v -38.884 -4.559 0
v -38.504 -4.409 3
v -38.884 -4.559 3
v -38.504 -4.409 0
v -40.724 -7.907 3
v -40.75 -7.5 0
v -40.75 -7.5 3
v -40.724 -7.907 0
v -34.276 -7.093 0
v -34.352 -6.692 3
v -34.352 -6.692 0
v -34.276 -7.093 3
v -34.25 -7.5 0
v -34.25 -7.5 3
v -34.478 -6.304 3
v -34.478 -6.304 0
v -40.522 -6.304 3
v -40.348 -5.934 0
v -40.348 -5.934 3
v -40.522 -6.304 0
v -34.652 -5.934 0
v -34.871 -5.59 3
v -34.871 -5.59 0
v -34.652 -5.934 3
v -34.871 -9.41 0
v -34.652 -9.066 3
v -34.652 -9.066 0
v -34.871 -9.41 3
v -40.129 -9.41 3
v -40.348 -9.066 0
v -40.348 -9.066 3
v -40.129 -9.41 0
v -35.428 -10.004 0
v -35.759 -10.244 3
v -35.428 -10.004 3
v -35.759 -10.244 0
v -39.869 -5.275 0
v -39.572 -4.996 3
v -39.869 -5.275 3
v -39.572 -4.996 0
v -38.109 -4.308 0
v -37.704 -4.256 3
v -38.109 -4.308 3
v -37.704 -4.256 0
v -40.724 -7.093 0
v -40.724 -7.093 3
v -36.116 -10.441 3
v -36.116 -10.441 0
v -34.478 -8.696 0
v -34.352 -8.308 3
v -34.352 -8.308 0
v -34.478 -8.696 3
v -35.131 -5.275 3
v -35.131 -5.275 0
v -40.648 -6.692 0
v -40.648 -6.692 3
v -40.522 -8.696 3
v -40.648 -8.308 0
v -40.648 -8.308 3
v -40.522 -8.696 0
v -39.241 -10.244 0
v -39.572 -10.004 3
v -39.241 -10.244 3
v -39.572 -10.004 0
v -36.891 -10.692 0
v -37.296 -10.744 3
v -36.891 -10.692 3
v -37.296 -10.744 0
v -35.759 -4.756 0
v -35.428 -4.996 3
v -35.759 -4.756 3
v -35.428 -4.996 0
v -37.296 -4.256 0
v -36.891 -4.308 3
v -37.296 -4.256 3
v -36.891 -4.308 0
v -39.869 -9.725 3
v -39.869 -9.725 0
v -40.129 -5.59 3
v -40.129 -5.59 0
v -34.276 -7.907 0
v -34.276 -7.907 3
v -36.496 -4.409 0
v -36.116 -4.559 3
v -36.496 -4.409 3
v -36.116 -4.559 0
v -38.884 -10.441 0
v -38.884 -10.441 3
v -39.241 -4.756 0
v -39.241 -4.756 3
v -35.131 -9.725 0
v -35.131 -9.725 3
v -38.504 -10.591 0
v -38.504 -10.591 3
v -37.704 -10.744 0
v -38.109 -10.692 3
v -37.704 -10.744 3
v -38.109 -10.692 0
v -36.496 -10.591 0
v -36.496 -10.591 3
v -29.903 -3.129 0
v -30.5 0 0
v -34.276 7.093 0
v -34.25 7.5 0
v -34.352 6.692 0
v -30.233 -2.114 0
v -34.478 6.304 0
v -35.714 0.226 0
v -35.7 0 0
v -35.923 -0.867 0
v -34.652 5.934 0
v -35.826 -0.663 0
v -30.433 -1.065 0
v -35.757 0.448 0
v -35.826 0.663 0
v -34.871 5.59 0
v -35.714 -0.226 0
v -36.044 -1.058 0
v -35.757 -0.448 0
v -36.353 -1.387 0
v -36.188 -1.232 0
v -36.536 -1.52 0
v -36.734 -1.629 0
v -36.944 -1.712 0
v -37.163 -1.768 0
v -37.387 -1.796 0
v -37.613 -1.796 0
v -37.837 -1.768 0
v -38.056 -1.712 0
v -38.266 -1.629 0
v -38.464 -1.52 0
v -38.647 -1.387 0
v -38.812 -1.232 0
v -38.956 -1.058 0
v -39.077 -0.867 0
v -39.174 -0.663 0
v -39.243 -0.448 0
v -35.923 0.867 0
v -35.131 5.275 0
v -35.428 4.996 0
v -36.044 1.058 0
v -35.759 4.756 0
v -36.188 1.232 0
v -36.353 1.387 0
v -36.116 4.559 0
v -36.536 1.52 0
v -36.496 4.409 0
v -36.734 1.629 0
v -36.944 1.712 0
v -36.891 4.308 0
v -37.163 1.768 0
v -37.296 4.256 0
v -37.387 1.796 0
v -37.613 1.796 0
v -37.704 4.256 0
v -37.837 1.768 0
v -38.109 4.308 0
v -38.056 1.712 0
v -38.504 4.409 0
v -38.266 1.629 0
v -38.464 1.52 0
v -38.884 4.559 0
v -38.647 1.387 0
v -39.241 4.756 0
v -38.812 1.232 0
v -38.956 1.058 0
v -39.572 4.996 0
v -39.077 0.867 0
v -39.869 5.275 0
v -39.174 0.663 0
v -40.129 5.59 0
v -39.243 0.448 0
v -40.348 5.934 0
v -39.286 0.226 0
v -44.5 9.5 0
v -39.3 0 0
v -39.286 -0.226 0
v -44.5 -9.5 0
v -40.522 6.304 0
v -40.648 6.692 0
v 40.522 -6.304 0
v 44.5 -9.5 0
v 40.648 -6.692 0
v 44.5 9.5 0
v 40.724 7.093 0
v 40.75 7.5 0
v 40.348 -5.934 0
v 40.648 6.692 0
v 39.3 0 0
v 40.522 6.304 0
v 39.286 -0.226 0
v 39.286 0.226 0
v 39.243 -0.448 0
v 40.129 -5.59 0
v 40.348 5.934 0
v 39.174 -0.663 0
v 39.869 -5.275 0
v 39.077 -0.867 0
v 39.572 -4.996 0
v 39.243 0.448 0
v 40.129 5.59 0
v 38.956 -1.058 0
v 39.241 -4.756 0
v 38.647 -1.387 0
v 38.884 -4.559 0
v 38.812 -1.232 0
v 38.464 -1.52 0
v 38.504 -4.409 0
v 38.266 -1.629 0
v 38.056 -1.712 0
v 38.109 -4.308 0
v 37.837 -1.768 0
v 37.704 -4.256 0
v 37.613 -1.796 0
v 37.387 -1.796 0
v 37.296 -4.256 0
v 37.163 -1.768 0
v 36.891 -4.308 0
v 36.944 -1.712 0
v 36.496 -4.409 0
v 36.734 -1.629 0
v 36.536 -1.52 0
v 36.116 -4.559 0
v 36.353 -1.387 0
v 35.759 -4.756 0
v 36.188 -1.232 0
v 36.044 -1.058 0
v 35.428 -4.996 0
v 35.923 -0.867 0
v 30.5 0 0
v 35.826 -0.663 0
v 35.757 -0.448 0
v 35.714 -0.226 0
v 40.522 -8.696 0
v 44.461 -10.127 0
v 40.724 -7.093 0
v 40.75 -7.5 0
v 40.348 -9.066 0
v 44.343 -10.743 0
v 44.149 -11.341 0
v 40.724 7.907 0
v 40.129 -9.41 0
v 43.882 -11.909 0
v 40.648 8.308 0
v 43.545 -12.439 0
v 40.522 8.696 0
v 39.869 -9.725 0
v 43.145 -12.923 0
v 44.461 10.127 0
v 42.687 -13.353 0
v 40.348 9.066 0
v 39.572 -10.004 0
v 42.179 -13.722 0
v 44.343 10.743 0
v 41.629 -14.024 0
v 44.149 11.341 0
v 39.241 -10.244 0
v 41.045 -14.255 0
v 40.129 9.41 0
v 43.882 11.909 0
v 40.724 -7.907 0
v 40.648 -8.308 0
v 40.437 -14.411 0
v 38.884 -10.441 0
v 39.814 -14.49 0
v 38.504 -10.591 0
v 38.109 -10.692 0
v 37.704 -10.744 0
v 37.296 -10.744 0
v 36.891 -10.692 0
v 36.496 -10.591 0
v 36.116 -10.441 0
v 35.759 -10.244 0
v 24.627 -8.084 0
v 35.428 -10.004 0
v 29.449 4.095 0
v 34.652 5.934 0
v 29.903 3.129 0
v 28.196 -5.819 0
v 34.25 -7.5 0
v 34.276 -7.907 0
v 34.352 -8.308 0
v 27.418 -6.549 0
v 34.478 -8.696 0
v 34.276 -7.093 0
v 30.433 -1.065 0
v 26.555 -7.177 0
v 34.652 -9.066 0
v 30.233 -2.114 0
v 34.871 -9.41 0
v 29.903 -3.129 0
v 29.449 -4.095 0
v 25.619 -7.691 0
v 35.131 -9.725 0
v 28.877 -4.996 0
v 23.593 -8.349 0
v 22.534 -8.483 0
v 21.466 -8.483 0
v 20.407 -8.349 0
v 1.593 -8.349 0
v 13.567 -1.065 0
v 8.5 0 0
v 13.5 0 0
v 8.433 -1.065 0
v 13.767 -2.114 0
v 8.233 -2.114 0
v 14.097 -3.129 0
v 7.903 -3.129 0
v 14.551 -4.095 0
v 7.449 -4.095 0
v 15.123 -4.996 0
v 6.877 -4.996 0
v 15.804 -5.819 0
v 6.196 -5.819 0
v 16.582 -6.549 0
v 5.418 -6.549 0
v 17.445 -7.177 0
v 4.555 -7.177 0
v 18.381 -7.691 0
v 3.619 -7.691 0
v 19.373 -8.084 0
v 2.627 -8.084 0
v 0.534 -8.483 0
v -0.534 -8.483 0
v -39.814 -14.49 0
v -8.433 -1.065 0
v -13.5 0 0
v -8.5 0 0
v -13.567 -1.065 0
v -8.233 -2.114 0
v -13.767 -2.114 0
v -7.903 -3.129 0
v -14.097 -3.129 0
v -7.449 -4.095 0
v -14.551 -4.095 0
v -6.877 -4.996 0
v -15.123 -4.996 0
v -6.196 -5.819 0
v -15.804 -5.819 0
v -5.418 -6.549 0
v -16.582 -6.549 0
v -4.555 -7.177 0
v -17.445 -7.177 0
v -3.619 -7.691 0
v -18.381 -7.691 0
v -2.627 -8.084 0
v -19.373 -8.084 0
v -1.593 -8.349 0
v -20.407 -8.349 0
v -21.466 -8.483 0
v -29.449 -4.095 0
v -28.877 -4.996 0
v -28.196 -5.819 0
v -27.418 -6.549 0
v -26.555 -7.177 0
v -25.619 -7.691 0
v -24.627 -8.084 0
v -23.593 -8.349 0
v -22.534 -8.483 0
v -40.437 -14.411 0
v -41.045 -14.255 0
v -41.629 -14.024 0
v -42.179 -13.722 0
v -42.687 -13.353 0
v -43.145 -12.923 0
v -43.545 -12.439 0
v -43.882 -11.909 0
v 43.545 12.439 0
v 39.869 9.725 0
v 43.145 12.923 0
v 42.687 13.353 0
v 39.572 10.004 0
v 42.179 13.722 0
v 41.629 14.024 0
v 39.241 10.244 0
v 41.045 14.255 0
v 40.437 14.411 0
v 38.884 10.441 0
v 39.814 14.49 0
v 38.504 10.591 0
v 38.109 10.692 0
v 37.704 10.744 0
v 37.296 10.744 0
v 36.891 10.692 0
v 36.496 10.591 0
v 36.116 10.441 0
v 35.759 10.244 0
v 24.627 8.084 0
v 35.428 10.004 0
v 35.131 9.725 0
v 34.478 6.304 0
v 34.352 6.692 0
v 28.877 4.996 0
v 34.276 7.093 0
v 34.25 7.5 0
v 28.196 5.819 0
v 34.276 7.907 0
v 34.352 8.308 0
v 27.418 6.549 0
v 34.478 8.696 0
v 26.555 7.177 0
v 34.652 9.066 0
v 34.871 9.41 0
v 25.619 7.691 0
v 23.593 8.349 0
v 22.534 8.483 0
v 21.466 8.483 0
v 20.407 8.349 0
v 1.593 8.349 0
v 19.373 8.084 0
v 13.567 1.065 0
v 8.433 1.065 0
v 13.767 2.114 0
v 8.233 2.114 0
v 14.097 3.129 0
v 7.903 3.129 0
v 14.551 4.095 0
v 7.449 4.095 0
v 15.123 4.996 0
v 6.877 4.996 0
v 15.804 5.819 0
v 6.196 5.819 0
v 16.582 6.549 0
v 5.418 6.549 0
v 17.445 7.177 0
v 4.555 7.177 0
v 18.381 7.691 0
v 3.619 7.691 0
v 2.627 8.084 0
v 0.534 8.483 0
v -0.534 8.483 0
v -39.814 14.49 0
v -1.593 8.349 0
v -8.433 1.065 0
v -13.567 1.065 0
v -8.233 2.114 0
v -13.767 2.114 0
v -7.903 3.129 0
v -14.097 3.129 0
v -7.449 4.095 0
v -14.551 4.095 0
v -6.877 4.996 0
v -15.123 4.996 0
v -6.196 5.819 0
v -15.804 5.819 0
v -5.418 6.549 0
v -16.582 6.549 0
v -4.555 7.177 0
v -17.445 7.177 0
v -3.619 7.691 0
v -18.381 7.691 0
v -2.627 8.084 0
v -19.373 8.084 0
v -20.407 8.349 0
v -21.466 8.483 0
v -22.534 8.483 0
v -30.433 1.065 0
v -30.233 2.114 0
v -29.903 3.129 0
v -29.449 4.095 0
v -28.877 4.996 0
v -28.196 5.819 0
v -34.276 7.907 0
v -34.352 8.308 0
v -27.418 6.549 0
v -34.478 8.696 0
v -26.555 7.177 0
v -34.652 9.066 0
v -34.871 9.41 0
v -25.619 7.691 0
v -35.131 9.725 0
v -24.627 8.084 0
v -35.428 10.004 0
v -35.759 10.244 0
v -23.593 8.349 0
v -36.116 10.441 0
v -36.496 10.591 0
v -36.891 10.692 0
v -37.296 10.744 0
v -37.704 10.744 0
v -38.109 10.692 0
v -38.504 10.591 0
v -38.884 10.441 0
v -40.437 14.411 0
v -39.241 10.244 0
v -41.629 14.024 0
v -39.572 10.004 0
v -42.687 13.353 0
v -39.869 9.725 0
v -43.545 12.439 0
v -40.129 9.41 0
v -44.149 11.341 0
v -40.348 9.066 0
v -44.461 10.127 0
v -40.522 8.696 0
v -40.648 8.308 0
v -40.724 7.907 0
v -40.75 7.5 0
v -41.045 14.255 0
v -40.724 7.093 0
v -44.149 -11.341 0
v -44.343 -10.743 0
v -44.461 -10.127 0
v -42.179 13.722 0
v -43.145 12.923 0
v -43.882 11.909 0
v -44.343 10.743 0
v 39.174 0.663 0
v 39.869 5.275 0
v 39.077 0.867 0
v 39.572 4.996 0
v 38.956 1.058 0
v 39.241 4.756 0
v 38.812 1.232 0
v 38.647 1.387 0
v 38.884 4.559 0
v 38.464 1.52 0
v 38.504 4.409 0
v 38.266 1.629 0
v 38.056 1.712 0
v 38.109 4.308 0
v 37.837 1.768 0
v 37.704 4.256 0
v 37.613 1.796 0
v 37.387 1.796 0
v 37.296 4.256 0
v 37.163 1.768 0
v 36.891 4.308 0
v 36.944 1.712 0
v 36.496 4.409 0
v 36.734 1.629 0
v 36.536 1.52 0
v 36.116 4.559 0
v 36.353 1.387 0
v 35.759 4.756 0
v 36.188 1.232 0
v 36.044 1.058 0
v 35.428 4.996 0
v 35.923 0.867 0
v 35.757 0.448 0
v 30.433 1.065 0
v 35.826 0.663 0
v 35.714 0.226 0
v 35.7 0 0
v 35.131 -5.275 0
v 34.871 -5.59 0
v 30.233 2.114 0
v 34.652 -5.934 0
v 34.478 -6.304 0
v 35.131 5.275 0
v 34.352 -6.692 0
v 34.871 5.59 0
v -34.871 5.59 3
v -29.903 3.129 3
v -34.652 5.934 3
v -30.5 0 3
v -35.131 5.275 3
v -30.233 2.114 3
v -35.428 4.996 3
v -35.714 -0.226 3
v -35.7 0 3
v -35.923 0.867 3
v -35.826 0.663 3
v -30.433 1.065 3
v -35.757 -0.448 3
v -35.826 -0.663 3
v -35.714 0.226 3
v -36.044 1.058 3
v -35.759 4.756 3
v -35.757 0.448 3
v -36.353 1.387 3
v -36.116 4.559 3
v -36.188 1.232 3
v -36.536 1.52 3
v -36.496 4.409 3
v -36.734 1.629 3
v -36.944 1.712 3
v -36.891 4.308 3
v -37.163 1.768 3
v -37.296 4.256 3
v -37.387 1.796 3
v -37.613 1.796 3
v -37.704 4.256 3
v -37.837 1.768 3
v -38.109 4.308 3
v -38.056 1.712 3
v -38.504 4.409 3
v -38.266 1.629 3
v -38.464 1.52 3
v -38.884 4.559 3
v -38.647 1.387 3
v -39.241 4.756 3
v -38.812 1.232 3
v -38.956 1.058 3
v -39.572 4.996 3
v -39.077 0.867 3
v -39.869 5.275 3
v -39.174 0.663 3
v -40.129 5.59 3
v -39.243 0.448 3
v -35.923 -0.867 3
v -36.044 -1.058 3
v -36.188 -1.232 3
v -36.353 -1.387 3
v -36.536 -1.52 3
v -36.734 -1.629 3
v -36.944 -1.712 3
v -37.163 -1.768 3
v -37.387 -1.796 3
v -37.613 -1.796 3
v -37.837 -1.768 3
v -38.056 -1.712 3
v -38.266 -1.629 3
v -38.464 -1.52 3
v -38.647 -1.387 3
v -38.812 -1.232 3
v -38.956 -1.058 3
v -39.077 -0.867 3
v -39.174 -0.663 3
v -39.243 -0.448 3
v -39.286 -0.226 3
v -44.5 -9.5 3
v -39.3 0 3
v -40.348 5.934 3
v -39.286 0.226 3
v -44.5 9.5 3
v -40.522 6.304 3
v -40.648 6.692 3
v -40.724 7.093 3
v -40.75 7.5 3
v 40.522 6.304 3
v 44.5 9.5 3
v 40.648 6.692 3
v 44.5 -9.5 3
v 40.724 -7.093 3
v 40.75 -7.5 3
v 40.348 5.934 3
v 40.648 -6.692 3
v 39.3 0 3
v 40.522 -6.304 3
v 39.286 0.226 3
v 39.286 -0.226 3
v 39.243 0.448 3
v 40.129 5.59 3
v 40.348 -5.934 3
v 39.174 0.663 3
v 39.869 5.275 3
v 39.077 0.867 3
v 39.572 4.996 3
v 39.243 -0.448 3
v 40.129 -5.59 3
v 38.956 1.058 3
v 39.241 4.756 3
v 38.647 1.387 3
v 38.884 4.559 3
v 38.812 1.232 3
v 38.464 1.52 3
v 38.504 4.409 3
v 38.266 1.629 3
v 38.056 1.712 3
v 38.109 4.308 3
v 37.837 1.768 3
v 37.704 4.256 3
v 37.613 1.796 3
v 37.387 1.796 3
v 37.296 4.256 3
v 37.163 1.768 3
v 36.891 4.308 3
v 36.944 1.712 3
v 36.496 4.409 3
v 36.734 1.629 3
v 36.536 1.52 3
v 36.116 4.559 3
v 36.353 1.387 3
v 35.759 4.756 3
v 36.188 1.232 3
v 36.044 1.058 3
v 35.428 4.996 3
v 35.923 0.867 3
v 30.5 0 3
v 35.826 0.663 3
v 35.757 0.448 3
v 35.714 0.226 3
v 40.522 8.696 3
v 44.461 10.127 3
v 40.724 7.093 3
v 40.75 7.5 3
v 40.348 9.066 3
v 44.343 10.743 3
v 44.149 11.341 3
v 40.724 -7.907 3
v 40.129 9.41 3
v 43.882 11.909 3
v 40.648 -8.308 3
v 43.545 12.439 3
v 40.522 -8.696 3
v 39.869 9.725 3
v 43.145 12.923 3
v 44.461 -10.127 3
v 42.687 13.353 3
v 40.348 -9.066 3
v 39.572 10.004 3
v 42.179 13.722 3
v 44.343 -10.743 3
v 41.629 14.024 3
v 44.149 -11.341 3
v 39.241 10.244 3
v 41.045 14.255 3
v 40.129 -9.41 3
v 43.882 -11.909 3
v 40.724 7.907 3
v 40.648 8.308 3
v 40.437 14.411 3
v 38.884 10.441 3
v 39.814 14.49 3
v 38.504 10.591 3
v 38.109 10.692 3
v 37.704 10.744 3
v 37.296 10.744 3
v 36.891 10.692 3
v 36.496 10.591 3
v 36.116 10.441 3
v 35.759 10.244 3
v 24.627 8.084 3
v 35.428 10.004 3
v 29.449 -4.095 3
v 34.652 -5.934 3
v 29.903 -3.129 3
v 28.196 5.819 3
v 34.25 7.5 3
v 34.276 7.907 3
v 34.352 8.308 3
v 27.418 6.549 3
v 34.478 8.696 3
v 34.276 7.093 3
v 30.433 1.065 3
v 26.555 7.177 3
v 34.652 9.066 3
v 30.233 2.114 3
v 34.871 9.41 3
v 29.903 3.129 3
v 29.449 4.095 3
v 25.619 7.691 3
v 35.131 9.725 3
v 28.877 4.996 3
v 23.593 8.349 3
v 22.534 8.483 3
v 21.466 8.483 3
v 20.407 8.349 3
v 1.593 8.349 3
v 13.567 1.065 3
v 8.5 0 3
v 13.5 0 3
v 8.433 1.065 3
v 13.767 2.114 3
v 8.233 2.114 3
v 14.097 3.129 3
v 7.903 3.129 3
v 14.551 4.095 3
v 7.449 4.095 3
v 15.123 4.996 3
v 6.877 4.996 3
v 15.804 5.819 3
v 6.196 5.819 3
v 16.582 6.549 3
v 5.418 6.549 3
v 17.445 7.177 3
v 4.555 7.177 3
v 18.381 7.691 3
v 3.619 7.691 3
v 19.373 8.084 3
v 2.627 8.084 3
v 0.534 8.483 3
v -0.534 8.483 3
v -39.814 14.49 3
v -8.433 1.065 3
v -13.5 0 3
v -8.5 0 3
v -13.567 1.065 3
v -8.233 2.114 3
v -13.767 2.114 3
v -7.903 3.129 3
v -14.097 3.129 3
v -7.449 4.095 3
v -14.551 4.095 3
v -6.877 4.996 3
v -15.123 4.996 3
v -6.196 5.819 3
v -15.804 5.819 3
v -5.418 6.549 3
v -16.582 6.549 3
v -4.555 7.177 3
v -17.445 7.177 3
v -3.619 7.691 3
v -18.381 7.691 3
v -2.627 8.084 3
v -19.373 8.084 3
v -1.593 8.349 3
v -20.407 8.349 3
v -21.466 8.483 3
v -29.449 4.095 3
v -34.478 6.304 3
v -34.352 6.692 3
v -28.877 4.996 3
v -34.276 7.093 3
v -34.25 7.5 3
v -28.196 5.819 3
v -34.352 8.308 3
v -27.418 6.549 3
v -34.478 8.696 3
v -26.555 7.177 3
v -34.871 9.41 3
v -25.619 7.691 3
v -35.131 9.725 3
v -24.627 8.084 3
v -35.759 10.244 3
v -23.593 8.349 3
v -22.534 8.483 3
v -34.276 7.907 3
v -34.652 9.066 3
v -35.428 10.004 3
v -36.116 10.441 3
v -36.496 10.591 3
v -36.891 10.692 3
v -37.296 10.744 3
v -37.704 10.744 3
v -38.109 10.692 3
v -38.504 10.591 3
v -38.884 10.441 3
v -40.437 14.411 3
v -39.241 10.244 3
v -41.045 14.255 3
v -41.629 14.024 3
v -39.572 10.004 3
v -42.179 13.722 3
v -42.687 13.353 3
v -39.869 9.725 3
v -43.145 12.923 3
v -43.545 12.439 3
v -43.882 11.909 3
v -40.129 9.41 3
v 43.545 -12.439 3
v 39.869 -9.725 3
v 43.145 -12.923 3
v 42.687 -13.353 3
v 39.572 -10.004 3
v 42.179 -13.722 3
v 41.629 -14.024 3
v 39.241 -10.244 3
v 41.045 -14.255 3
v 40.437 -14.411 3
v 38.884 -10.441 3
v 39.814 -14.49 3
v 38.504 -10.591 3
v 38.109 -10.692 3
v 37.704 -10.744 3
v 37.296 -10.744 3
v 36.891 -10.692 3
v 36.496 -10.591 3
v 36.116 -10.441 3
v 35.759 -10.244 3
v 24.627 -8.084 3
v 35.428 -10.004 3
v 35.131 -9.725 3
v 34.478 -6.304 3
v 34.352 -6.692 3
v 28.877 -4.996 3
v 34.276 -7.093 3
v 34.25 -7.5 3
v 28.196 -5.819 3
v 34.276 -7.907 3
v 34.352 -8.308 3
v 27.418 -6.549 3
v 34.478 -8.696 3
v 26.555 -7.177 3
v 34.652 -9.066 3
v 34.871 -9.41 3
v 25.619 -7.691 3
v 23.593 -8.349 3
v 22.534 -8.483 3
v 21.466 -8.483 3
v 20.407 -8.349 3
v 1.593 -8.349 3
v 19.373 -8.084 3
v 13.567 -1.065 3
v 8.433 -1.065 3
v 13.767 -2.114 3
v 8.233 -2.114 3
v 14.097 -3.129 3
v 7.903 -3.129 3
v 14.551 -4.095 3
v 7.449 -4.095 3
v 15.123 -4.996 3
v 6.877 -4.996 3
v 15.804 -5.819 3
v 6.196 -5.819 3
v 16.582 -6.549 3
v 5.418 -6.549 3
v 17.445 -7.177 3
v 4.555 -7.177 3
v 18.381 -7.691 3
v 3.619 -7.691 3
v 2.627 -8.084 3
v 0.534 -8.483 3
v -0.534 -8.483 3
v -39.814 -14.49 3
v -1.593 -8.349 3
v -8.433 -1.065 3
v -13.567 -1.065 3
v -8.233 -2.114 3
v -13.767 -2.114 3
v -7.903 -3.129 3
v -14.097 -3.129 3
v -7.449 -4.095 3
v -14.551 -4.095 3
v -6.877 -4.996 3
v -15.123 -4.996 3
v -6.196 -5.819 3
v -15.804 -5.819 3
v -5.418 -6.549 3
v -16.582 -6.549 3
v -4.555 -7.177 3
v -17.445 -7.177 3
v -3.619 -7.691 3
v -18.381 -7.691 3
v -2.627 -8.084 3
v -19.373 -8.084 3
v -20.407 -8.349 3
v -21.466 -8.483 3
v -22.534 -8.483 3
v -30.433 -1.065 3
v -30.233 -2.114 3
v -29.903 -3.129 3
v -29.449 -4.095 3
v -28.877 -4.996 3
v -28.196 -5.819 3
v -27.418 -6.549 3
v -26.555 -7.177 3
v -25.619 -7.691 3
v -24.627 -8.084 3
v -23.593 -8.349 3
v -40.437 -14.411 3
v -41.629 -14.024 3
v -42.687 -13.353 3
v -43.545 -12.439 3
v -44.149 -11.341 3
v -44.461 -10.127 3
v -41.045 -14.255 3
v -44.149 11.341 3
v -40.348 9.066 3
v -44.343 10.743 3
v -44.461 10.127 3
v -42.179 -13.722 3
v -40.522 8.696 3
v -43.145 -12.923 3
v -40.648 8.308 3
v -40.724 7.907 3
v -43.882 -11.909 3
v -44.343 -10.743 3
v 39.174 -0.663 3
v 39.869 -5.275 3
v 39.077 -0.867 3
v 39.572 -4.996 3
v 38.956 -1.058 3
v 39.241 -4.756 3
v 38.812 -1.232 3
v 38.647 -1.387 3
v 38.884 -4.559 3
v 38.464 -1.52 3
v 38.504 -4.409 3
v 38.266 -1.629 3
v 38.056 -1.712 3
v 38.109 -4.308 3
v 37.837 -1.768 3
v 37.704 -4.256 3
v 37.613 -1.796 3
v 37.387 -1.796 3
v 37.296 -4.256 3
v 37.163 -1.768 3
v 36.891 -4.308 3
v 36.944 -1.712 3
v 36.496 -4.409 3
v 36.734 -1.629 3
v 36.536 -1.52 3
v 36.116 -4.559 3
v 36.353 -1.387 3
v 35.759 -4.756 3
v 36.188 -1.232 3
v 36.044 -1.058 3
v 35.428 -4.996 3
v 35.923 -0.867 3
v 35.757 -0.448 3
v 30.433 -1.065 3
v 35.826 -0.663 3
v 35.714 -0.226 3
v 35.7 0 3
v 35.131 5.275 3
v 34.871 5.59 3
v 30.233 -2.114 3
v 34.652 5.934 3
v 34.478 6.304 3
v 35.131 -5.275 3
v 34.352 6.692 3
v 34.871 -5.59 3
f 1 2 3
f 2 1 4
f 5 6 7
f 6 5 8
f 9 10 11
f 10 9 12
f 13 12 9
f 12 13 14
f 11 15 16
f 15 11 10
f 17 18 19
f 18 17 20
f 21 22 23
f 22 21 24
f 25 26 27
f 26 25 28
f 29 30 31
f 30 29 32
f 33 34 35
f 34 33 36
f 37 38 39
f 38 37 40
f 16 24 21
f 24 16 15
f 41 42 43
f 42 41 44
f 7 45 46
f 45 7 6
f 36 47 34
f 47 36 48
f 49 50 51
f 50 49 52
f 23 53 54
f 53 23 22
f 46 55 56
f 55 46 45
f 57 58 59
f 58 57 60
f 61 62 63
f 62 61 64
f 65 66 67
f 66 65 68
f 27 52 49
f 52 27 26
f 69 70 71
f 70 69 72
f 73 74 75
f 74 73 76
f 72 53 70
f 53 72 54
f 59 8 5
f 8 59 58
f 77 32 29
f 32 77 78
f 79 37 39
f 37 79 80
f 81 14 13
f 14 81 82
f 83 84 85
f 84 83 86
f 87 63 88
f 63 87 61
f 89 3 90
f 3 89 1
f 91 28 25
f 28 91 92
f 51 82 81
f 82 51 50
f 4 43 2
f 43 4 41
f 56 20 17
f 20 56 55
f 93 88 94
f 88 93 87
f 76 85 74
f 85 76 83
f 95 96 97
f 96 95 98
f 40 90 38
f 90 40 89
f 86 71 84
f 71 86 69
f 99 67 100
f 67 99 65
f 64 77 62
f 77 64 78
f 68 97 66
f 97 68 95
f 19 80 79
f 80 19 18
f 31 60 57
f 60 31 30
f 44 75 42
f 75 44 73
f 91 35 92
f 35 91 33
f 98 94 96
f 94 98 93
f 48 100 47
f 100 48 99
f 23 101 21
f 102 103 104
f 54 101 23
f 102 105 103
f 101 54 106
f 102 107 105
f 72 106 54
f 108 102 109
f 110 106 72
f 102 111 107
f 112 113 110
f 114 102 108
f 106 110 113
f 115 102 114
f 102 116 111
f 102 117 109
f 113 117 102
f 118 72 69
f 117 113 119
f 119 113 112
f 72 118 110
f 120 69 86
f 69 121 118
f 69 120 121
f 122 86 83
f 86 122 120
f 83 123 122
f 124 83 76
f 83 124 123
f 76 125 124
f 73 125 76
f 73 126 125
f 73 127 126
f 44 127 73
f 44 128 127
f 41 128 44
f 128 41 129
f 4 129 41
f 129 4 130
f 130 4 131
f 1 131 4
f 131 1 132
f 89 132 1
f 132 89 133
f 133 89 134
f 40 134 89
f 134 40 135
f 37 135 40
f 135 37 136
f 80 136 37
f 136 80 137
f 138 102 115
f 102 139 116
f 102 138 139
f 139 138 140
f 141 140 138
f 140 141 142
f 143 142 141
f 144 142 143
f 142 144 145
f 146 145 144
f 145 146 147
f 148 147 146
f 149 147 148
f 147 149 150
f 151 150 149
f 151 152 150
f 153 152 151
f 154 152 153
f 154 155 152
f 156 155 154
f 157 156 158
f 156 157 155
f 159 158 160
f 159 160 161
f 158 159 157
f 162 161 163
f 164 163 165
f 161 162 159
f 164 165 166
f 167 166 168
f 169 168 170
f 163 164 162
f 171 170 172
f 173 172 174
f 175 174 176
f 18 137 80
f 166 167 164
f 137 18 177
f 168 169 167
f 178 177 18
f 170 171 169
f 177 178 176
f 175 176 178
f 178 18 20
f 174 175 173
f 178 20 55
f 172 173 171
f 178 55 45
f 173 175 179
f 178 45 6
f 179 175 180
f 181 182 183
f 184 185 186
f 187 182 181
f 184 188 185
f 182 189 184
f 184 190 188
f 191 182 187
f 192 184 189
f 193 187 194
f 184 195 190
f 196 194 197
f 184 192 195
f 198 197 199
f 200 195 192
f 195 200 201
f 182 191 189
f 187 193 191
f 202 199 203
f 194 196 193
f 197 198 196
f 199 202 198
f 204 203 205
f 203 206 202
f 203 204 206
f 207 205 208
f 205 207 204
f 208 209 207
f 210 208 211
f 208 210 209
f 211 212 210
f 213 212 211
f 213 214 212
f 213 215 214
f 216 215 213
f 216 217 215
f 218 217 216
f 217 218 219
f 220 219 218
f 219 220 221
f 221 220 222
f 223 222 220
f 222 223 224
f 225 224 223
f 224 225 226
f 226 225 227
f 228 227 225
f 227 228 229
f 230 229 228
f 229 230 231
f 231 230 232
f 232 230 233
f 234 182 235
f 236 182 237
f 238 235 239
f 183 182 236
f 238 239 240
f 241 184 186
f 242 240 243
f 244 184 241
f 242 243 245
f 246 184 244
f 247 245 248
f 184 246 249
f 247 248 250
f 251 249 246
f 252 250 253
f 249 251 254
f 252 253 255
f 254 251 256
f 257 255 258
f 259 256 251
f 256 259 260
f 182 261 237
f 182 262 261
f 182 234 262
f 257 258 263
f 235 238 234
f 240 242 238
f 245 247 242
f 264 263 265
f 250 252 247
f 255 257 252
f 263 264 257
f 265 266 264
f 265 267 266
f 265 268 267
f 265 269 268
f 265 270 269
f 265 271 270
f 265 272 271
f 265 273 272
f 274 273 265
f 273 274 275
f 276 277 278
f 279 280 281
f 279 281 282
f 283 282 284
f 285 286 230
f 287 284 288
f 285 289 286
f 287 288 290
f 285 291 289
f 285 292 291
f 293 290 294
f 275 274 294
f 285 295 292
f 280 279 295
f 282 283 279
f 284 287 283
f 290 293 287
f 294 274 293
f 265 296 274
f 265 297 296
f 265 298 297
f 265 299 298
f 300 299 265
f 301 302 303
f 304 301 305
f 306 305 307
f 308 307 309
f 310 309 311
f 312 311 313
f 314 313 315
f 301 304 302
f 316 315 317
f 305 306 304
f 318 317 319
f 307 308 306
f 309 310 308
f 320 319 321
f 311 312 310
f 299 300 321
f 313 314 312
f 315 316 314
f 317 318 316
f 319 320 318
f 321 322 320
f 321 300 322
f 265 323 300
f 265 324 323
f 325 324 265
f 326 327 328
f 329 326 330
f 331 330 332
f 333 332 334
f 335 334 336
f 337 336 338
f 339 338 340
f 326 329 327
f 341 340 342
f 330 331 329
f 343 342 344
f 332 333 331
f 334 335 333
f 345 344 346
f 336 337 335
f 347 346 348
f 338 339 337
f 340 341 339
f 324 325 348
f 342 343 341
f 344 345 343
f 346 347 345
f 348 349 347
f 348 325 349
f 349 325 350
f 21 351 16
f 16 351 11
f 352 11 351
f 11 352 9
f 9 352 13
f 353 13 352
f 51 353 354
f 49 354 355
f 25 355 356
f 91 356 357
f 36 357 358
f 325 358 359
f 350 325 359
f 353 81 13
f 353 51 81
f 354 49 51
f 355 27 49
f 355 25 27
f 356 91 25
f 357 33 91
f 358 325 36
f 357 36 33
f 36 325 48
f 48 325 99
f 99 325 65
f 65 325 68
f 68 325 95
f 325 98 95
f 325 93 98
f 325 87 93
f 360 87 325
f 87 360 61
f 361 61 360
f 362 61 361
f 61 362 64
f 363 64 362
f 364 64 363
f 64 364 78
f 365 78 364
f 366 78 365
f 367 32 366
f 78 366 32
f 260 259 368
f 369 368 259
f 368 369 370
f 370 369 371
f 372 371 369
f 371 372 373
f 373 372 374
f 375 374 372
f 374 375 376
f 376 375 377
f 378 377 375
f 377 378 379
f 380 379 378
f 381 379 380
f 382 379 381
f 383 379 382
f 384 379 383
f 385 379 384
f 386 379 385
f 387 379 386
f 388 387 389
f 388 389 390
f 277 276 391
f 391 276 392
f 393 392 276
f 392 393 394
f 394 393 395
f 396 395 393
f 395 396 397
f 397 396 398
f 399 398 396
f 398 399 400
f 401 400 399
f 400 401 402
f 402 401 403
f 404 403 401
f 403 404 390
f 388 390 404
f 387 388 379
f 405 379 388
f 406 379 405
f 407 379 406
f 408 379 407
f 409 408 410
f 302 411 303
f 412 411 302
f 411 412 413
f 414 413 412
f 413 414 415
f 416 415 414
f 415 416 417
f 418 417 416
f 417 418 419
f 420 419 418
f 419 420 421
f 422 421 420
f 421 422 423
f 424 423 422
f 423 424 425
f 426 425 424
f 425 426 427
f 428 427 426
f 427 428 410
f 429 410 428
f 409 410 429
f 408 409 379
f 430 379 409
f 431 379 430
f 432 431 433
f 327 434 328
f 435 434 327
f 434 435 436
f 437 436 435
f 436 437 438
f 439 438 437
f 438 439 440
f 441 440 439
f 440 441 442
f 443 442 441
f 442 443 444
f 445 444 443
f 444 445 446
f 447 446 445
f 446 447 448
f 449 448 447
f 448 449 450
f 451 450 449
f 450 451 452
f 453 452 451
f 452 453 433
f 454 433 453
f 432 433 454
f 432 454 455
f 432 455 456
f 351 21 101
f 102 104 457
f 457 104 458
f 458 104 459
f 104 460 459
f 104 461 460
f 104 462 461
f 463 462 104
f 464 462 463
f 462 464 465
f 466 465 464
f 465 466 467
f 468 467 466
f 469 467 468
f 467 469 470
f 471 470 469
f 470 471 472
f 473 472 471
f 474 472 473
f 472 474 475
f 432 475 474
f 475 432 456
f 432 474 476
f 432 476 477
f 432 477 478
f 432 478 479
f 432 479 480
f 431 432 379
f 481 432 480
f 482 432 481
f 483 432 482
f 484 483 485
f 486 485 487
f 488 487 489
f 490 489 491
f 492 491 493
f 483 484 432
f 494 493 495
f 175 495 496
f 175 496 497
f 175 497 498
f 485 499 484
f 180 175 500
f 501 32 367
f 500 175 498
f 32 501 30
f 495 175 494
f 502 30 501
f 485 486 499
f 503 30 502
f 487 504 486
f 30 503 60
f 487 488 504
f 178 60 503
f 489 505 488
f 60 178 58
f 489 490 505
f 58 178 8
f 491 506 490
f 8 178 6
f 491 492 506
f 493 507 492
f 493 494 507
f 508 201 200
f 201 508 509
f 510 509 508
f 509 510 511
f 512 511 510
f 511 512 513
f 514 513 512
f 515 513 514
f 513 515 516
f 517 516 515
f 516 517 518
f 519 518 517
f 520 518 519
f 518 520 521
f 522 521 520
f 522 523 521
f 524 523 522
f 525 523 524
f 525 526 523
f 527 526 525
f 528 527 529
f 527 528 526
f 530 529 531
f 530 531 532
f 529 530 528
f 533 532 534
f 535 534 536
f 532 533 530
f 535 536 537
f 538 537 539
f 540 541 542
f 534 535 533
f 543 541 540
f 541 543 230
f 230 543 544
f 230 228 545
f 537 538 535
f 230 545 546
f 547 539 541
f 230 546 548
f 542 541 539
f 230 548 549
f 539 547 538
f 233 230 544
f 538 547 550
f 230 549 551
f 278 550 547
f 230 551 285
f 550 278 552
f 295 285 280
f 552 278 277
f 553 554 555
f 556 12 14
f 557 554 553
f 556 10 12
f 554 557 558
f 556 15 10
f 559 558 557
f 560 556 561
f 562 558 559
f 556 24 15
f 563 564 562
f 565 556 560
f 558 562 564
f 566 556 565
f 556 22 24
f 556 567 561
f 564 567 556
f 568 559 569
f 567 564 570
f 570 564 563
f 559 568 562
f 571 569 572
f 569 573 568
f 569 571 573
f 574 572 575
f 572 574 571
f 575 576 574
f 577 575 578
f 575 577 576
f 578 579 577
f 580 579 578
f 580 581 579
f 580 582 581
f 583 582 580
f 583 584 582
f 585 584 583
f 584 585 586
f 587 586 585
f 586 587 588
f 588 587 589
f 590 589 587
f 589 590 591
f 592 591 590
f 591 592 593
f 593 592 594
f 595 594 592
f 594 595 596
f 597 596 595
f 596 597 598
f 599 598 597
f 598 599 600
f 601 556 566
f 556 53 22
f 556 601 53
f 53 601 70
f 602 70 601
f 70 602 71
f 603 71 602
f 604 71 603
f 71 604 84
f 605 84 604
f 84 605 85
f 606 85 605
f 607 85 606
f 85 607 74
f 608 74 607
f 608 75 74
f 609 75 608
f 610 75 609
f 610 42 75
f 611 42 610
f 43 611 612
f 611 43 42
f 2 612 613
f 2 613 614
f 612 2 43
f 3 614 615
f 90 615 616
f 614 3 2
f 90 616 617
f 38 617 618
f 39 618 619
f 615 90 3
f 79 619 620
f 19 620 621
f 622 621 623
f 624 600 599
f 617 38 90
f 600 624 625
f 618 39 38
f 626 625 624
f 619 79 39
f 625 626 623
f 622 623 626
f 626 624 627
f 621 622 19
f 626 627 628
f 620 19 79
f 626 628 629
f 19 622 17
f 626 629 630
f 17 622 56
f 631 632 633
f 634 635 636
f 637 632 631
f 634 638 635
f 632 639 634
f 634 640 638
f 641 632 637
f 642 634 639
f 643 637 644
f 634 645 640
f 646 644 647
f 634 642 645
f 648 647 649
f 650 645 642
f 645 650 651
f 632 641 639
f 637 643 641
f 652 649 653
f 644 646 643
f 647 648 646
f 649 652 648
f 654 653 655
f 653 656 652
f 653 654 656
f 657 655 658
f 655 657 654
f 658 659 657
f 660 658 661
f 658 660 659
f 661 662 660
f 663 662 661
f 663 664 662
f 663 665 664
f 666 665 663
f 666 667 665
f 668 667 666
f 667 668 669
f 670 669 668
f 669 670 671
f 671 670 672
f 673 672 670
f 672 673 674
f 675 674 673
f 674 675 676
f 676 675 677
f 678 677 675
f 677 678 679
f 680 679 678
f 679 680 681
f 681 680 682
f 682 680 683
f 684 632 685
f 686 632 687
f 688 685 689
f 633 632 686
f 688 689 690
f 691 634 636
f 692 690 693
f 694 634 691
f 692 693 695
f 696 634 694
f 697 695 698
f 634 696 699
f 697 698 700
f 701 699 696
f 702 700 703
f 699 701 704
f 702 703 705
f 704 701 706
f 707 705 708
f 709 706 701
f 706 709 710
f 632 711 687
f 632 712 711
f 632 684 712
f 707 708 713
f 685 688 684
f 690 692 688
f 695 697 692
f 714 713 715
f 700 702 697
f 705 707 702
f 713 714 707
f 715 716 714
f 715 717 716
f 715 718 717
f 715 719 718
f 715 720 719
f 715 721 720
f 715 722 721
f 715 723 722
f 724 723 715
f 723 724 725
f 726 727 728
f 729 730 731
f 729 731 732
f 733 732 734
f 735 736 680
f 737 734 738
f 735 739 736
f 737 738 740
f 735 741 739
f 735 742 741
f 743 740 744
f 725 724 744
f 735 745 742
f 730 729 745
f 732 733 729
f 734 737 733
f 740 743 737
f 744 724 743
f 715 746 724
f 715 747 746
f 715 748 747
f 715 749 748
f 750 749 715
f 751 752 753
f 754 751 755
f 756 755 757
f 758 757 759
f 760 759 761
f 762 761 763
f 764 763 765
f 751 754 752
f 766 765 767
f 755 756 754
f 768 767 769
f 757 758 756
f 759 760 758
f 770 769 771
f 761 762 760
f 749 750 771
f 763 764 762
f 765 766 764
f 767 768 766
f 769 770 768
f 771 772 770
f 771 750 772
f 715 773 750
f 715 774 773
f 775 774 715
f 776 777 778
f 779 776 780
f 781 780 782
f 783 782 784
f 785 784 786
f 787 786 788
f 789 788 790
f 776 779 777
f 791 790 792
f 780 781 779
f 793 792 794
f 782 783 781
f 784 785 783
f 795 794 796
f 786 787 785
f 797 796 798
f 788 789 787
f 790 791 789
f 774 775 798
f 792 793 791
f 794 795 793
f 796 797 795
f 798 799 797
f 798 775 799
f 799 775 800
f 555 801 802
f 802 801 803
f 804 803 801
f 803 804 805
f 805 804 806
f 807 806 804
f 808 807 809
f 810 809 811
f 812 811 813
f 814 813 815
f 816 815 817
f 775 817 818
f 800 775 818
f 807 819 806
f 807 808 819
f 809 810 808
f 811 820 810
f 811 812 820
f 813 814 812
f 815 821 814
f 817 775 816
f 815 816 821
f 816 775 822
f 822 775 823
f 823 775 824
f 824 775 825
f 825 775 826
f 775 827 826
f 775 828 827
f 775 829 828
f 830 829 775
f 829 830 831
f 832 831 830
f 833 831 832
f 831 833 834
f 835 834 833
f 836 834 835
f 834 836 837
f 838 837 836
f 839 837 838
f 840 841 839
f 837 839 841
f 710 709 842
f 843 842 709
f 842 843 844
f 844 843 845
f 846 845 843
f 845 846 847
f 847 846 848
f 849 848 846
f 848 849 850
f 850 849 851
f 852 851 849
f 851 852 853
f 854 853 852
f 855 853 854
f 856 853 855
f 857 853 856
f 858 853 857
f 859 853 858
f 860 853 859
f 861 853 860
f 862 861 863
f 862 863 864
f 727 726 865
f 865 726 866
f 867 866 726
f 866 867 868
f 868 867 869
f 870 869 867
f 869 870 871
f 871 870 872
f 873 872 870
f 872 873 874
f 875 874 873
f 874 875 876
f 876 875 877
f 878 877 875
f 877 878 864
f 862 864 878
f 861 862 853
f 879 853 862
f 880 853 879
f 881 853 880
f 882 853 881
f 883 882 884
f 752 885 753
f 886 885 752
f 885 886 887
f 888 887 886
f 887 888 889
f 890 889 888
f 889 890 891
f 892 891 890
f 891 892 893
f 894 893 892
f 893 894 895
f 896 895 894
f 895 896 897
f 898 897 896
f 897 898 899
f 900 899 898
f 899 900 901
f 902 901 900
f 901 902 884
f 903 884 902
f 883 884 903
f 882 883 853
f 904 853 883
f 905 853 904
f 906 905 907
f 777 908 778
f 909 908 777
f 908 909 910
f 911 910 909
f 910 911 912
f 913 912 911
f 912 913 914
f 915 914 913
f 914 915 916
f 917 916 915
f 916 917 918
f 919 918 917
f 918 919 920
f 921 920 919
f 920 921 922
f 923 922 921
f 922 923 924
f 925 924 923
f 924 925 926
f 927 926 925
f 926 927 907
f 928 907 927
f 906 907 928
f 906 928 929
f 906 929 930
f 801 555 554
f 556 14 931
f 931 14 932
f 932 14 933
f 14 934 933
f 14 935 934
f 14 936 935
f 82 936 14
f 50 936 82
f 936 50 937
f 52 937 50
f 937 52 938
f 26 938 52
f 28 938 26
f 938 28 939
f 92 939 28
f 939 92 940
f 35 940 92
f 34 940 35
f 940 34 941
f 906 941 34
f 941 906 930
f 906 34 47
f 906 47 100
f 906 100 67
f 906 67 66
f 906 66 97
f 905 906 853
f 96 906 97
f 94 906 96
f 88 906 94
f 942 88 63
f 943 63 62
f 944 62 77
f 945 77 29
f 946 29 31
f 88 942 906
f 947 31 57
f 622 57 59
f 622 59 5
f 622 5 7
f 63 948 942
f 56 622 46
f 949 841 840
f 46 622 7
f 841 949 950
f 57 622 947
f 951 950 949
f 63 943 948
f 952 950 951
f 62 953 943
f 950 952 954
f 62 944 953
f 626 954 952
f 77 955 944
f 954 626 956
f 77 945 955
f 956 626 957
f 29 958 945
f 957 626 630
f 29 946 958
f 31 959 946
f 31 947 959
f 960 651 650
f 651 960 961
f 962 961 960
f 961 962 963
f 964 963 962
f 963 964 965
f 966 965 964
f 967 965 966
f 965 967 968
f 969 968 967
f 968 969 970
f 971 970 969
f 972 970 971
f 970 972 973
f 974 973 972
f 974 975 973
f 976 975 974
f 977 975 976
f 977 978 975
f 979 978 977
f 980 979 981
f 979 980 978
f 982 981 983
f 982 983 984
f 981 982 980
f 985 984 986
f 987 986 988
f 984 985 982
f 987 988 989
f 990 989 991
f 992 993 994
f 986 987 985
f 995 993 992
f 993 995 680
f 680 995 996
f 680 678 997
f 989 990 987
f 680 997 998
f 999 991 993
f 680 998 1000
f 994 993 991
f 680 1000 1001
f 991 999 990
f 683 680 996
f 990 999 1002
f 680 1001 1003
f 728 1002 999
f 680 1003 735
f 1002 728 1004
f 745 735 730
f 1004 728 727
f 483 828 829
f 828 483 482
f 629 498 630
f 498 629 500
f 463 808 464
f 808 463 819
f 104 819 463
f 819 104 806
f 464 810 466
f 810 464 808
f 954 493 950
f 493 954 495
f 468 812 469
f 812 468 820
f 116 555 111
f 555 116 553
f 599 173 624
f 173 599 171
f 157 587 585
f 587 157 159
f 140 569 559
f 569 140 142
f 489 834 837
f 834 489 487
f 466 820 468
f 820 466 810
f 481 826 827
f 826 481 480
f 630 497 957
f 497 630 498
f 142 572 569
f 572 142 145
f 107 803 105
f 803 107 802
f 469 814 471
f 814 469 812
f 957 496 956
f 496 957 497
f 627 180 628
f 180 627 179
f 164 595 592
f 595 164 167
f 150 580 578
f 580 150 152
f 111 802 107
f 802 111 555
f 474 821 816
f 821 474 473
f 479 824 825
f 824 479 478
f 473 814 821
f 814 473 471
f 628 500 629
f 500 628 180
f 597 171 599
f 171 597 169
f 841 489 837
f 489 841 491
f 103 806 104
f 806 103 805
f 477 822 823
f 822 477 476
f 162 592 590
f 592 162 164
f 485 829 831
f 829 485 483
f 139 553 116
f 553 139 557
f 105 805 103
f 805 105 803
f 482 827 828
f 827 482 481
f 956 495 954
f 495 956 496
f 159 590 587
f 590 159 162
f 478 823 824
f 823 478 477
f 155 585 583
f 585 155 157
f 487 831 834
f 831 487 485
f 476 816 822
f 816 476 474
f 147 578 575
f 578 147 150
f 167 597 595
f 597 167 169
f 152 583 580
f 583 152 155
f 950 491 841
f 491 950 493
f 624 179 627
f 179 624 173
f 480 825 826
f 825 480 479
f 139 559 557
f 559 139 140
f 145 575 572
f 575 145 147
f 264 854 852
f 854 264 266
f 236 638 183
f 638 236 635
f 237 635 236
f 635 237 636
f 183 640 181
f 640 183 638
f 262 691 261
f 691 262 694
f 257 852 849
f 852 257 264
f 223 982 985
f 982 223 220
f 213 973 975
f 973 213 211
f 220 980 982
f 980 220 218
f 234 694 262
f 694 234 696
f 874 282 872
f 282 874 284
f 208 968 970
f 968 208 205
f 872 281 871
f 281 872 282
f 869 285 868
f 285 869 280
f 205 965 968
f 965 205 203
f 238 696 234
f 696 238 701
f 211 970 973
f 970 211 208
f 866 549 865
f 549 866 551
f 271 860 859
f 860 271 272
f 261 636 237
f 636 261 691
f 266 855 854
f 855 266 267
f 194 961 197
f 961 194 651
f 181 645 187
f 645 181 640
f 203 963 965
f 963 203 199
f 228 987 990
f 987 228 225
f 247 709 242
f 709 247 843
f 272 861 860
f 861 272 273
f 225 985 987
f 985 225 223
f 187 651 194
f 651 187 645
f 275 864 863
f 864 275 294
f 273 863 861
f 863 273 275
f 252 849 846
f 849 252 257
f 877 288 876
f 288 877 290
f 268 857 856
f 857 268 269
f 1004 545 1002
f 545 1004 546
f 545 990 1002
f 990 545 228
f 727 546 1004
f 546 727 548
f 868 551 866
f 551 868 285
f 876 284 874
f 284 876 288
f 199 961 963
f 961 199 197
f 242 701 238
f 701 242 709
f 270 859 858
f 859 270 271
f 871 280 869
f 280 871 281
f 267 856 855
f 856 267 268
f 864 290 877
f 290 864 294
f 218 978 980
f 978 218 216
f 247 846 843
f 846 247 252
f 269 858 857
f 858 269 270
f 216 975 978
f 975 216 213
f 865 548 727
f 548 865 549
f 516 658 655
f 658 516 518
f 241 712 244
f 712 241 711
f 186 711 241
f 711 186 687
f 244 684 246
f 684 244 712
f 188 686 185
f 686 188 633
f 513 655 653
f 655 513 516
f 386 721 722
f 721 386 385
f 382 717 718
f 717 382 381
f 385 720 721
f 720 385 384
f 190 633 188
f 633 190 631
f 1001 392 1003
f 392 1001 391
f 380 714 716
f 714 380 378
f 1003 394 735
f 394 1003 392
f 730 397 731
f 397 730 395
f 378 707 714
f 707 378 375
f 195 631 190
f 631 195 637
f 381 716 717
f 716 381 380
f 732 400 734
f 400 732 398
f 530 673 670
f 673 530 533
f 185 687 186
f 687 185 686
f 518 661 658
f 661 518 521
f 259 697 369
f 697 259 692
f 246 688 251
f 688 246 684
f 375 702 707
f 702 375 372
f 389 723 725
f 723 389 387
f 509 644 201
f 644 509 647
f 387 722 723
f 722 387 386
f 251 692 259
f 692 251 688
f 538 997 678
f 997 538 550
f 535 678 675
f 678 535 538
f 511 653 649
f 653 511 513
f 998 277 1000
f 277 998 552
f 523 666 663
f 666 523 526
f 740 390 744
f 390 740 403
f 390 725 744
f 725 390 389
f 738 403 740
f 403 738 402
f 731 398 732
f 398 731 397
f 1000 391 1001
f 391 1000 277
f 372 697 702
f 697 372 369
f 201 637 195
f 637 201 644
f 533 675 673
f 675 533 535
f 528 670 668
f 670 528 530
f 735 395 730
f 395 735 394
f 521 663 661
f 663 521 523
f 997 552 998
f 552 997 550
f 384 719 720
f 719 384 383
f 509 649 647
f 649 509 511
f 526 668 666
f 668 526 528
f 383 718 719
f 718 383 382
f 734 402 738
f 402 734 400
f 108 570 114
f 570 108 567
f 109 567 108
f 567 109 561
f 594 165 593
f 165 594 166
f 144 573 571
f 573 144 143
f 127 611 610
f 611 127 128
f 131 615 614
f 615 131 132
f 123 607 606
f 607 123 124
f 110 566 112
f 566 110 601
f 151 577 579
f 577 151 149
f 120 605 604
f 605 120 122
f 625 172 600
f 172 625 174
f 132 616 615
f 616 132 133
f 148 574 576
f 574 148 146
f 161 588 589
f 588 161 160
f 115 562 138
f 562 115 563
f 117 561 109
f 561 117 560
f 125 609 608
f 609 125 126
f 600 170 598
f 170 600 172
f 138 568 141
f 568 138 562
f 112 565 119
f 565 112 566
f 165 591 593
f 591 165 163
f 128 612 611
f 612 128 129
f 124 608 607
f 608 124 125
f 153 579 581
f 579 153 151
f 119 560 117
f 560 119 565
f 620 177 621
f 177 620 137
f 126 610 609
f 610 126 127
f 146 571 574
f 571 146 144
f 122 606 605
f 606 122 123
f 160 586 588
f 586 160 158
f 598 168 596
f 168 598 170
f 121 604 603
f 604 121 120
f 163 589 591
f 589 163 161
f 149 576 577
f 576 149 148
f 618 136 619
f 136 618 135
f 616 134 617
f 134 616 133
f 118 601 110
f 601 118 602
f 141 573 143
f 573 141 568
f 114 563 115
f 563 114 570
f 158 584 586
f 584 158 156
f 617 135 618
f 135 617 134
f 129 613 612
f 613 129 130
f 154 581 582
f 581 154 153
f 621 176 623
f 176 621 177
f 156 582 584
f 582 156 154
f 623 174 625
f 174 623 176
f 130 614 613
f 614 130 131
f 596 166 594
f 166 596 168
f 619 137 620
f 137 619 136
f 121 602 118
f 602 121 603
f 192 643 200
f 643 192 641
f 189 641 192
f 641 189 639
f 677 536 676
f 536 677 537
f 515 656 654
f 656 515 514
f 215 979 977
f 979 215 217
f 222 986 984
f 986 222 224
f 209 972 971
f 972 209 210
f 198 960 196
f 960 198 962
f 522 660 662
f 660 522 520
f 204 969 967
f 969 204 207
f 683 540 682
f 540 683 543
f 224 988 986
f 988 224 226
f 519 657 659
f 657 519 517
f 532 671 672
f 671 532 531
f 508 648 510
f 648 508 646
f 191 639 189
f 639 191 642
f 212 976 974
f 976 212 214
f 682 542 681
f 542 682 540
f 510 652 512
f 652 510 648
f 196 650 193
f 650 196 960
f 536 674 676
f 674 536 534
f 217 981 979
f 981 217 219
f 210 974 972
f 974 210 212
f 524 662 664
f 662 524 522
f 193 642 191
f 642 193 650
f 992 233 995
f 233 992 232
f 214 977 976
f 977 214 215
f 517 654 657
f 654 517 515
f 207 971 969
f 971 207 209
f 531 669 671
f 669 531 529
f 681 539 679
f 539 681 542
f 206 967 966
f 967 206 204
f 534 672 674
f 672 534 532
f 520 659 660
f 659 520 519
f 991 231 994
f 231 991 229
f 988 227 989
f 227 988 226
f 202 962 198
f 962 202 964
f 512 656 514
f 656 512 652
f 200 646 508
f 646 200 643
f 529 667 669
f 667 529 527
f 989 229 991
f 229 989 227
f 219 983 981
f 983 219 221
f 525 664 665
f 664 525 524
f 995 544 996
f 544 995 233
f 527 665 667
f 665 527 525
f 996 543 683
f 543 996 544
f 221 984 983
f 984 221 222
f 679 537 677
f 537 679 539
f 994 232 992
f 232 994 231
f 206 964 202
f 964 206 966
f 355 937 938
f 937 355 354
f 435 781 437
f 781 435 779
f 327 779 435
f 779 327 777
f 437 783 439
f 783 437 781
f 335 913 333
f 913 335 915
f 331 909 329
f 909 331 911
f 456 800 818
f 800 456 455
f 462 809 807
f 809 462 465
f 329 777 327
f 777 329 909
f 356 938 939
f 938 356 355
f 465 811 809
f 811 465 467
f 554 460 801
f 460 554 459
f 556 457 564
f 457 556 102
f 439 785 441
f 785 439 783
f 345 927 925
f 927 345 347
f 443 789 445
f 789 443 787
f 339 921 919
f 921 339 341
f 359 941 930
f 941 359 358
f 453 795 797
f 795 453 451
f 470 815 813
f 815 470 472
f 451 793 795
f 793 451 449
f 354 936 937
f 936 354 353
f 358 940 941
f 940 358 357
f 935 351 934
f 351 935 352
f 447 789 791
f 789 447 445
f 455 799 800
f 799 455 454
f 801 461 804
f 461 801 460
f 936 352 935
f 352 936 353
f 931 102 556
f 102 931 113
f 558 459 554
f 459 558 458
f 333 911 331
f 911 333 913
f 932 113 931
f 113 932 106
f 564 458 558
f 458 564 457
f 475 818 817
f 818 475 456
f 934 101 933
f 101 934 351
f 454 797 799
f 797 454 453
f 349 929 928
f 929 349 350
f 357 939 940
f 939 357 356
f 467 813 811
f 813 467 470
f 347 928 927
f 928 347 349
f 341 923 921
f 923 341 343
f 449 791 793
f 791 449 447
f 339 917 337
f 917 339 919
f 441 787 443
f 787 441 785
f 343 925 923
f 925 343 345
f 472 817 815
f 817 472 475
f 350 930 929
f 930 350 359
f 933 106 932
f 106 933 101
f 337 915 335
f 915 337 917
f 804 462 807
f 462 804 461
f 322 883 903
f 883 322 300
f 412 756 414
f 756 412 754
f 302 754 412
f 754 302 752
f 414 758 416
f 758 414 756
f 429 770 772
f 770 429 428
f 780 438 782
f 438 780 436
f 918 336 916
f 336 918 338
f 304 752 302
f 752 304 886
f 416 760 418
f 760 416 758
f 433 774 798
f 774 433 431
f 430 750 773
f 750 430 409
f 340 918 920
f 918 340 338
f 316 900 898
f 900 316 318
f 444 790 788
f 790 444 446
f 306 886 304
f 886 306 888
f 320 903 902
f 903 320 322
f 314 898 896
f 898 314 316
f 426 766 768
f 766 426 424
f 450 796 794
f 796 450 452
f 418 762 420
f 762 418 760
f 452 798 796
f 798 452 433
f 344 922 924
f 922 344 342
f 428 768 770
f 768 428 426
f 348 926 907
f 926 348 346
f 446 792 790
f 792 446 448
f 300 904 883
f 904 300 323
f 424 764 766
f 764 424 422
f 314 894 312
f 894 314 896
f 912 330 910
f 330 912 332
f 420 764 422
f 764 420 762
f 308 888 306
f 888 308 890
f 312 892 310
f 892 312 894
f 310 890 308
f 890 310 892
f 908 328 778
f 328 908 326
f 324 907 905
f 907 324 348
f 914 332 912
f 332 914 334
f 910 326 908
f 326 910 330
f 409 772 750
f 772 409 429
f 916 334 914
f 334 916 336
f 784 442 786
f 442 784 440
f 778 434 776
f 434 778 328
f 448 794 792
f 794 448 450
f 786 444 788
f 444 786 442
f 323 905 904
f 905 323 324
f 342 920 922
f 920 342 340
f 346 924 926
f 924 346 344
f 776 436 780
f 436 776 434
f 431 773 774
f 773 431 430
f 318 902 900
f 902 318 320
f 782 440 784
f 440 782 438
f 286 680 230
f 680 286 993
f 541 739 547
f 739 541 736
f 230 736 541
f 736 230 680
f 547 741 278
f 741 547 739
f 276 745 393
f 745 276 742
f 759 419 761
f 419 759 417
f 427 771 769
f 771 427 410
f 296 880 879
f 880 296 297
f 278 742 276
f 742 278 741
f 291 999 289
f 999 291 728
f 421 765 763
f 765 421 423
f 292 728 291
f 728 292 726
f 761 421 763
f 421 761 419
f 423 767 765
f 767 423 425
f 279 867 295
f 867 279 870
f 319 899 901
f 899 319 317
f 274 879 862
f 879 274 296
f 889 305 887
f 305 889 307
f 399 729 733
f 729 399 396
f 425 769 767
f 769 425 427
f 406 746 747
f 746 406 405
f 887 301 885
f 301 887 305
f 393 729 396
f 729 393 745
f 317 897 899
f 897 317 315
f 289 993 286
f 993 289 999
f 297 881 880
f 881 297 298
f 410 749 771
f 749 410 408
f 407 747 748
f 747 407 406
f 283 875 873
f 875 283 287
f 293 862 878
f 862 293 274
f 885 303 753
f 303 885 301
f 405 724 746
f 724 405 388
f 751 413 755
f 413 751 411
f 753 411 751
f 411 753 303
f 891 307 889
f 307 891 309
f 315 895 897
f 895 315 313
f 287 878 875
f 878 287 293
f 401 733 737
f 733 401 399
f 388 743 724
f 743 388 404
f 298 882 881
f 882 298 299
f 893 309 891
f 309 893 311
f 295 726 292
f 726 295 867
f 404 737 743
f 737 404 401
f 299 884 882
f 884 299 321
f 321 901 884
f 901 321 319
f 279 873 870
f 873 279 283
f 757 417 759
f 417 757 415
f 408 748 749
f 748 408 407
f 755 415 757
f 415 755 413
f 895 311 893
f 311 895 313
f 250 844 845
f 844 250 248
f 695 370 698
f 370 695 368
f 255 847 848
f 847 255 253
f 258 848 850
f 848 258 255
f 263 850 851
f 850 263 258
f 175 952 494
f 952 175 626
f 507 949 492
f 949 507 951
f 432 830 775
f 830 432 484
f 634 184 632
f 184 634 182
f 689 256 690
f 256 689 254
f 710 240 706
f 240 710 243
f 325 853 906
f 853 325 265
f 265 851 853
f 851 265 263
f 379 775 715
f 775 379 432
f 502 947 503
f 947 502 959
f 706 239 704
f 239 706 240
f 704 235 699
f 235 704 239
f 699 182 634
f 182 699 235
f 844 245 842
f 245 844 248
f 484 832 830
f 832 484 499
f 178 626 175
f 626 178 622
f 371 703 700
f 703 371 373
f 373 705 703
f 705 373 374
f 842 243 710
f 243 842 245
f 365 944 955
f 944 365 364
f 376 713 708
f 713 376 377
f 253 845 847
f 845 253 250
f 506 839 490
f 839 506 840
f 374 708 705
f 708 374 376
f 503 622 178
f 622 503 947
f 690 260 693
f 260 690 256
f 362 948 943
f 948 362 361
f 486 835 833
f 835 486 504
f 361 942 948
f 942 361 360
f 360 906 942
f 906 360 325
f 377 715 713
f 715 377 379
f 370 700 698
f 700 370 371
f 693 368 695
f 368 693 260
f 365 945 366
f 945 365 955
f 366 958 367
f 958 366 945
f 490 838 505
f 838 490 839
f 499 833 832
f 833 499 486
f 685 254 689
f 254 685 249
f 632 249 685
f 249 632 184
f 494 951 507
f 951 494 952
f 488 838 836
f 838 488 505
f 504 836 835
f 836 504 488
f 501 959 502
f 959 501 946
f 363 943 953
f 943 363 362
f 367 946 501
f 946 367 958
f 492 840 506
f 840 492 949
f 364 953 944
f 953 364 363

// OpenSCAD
$fn = 50;

difference() {
	union() {
		hull() {
			translate(v = [-39.5, 9.5, 0]) {
				cylinder(h = 3, r = 5);
			}
			translate(v = [39.5, 9.5, 0]) {
				cylinder(h = 3, r = 5);
			}
			translate(v = [-39.5, -9.5, 0]) {
				cylinder(h = 3, r = 5);
			}
			translate(v = [39.5, -9.5, 0]) {
				cylinder(h = 3, r = 5);
			}
		}
	}
	union() {
		translate(v = [-37.5, -7.5, 0]) {
			cylinder(h = 3, r = 3.25);
		}
		translate(v = [-37.5, 7.5, 0]) {
			cylinder(h = 3, r = 3.25);
		}
		translate(v = [37.5, -7.5, 0]) {
			cylinder(h = 3, r = 3.25);
		}
		translate(v = [37.5, 7.5, 0]) {
			cylinder(h = 3, r = 3.25);
		}
		translate(v = [-37.5, 0.0, 0]) {
			cylinder(h = 3, r = 1.8);
		}
		translate(v = [37.5, 0.0, 0]) {
			cylinder(h = 3, r = 1.8);
		}
		translate(v = [-22.0, 0, 0.0]) {
			cylinder(h = 3, r = 8.5);
		}
		cylinder(h = 3, r = 8.5);
		translate(v = [22.0, 0, 0.0]) {
			cylinder(h = 3, r = 8.5);
		}
	}
}
